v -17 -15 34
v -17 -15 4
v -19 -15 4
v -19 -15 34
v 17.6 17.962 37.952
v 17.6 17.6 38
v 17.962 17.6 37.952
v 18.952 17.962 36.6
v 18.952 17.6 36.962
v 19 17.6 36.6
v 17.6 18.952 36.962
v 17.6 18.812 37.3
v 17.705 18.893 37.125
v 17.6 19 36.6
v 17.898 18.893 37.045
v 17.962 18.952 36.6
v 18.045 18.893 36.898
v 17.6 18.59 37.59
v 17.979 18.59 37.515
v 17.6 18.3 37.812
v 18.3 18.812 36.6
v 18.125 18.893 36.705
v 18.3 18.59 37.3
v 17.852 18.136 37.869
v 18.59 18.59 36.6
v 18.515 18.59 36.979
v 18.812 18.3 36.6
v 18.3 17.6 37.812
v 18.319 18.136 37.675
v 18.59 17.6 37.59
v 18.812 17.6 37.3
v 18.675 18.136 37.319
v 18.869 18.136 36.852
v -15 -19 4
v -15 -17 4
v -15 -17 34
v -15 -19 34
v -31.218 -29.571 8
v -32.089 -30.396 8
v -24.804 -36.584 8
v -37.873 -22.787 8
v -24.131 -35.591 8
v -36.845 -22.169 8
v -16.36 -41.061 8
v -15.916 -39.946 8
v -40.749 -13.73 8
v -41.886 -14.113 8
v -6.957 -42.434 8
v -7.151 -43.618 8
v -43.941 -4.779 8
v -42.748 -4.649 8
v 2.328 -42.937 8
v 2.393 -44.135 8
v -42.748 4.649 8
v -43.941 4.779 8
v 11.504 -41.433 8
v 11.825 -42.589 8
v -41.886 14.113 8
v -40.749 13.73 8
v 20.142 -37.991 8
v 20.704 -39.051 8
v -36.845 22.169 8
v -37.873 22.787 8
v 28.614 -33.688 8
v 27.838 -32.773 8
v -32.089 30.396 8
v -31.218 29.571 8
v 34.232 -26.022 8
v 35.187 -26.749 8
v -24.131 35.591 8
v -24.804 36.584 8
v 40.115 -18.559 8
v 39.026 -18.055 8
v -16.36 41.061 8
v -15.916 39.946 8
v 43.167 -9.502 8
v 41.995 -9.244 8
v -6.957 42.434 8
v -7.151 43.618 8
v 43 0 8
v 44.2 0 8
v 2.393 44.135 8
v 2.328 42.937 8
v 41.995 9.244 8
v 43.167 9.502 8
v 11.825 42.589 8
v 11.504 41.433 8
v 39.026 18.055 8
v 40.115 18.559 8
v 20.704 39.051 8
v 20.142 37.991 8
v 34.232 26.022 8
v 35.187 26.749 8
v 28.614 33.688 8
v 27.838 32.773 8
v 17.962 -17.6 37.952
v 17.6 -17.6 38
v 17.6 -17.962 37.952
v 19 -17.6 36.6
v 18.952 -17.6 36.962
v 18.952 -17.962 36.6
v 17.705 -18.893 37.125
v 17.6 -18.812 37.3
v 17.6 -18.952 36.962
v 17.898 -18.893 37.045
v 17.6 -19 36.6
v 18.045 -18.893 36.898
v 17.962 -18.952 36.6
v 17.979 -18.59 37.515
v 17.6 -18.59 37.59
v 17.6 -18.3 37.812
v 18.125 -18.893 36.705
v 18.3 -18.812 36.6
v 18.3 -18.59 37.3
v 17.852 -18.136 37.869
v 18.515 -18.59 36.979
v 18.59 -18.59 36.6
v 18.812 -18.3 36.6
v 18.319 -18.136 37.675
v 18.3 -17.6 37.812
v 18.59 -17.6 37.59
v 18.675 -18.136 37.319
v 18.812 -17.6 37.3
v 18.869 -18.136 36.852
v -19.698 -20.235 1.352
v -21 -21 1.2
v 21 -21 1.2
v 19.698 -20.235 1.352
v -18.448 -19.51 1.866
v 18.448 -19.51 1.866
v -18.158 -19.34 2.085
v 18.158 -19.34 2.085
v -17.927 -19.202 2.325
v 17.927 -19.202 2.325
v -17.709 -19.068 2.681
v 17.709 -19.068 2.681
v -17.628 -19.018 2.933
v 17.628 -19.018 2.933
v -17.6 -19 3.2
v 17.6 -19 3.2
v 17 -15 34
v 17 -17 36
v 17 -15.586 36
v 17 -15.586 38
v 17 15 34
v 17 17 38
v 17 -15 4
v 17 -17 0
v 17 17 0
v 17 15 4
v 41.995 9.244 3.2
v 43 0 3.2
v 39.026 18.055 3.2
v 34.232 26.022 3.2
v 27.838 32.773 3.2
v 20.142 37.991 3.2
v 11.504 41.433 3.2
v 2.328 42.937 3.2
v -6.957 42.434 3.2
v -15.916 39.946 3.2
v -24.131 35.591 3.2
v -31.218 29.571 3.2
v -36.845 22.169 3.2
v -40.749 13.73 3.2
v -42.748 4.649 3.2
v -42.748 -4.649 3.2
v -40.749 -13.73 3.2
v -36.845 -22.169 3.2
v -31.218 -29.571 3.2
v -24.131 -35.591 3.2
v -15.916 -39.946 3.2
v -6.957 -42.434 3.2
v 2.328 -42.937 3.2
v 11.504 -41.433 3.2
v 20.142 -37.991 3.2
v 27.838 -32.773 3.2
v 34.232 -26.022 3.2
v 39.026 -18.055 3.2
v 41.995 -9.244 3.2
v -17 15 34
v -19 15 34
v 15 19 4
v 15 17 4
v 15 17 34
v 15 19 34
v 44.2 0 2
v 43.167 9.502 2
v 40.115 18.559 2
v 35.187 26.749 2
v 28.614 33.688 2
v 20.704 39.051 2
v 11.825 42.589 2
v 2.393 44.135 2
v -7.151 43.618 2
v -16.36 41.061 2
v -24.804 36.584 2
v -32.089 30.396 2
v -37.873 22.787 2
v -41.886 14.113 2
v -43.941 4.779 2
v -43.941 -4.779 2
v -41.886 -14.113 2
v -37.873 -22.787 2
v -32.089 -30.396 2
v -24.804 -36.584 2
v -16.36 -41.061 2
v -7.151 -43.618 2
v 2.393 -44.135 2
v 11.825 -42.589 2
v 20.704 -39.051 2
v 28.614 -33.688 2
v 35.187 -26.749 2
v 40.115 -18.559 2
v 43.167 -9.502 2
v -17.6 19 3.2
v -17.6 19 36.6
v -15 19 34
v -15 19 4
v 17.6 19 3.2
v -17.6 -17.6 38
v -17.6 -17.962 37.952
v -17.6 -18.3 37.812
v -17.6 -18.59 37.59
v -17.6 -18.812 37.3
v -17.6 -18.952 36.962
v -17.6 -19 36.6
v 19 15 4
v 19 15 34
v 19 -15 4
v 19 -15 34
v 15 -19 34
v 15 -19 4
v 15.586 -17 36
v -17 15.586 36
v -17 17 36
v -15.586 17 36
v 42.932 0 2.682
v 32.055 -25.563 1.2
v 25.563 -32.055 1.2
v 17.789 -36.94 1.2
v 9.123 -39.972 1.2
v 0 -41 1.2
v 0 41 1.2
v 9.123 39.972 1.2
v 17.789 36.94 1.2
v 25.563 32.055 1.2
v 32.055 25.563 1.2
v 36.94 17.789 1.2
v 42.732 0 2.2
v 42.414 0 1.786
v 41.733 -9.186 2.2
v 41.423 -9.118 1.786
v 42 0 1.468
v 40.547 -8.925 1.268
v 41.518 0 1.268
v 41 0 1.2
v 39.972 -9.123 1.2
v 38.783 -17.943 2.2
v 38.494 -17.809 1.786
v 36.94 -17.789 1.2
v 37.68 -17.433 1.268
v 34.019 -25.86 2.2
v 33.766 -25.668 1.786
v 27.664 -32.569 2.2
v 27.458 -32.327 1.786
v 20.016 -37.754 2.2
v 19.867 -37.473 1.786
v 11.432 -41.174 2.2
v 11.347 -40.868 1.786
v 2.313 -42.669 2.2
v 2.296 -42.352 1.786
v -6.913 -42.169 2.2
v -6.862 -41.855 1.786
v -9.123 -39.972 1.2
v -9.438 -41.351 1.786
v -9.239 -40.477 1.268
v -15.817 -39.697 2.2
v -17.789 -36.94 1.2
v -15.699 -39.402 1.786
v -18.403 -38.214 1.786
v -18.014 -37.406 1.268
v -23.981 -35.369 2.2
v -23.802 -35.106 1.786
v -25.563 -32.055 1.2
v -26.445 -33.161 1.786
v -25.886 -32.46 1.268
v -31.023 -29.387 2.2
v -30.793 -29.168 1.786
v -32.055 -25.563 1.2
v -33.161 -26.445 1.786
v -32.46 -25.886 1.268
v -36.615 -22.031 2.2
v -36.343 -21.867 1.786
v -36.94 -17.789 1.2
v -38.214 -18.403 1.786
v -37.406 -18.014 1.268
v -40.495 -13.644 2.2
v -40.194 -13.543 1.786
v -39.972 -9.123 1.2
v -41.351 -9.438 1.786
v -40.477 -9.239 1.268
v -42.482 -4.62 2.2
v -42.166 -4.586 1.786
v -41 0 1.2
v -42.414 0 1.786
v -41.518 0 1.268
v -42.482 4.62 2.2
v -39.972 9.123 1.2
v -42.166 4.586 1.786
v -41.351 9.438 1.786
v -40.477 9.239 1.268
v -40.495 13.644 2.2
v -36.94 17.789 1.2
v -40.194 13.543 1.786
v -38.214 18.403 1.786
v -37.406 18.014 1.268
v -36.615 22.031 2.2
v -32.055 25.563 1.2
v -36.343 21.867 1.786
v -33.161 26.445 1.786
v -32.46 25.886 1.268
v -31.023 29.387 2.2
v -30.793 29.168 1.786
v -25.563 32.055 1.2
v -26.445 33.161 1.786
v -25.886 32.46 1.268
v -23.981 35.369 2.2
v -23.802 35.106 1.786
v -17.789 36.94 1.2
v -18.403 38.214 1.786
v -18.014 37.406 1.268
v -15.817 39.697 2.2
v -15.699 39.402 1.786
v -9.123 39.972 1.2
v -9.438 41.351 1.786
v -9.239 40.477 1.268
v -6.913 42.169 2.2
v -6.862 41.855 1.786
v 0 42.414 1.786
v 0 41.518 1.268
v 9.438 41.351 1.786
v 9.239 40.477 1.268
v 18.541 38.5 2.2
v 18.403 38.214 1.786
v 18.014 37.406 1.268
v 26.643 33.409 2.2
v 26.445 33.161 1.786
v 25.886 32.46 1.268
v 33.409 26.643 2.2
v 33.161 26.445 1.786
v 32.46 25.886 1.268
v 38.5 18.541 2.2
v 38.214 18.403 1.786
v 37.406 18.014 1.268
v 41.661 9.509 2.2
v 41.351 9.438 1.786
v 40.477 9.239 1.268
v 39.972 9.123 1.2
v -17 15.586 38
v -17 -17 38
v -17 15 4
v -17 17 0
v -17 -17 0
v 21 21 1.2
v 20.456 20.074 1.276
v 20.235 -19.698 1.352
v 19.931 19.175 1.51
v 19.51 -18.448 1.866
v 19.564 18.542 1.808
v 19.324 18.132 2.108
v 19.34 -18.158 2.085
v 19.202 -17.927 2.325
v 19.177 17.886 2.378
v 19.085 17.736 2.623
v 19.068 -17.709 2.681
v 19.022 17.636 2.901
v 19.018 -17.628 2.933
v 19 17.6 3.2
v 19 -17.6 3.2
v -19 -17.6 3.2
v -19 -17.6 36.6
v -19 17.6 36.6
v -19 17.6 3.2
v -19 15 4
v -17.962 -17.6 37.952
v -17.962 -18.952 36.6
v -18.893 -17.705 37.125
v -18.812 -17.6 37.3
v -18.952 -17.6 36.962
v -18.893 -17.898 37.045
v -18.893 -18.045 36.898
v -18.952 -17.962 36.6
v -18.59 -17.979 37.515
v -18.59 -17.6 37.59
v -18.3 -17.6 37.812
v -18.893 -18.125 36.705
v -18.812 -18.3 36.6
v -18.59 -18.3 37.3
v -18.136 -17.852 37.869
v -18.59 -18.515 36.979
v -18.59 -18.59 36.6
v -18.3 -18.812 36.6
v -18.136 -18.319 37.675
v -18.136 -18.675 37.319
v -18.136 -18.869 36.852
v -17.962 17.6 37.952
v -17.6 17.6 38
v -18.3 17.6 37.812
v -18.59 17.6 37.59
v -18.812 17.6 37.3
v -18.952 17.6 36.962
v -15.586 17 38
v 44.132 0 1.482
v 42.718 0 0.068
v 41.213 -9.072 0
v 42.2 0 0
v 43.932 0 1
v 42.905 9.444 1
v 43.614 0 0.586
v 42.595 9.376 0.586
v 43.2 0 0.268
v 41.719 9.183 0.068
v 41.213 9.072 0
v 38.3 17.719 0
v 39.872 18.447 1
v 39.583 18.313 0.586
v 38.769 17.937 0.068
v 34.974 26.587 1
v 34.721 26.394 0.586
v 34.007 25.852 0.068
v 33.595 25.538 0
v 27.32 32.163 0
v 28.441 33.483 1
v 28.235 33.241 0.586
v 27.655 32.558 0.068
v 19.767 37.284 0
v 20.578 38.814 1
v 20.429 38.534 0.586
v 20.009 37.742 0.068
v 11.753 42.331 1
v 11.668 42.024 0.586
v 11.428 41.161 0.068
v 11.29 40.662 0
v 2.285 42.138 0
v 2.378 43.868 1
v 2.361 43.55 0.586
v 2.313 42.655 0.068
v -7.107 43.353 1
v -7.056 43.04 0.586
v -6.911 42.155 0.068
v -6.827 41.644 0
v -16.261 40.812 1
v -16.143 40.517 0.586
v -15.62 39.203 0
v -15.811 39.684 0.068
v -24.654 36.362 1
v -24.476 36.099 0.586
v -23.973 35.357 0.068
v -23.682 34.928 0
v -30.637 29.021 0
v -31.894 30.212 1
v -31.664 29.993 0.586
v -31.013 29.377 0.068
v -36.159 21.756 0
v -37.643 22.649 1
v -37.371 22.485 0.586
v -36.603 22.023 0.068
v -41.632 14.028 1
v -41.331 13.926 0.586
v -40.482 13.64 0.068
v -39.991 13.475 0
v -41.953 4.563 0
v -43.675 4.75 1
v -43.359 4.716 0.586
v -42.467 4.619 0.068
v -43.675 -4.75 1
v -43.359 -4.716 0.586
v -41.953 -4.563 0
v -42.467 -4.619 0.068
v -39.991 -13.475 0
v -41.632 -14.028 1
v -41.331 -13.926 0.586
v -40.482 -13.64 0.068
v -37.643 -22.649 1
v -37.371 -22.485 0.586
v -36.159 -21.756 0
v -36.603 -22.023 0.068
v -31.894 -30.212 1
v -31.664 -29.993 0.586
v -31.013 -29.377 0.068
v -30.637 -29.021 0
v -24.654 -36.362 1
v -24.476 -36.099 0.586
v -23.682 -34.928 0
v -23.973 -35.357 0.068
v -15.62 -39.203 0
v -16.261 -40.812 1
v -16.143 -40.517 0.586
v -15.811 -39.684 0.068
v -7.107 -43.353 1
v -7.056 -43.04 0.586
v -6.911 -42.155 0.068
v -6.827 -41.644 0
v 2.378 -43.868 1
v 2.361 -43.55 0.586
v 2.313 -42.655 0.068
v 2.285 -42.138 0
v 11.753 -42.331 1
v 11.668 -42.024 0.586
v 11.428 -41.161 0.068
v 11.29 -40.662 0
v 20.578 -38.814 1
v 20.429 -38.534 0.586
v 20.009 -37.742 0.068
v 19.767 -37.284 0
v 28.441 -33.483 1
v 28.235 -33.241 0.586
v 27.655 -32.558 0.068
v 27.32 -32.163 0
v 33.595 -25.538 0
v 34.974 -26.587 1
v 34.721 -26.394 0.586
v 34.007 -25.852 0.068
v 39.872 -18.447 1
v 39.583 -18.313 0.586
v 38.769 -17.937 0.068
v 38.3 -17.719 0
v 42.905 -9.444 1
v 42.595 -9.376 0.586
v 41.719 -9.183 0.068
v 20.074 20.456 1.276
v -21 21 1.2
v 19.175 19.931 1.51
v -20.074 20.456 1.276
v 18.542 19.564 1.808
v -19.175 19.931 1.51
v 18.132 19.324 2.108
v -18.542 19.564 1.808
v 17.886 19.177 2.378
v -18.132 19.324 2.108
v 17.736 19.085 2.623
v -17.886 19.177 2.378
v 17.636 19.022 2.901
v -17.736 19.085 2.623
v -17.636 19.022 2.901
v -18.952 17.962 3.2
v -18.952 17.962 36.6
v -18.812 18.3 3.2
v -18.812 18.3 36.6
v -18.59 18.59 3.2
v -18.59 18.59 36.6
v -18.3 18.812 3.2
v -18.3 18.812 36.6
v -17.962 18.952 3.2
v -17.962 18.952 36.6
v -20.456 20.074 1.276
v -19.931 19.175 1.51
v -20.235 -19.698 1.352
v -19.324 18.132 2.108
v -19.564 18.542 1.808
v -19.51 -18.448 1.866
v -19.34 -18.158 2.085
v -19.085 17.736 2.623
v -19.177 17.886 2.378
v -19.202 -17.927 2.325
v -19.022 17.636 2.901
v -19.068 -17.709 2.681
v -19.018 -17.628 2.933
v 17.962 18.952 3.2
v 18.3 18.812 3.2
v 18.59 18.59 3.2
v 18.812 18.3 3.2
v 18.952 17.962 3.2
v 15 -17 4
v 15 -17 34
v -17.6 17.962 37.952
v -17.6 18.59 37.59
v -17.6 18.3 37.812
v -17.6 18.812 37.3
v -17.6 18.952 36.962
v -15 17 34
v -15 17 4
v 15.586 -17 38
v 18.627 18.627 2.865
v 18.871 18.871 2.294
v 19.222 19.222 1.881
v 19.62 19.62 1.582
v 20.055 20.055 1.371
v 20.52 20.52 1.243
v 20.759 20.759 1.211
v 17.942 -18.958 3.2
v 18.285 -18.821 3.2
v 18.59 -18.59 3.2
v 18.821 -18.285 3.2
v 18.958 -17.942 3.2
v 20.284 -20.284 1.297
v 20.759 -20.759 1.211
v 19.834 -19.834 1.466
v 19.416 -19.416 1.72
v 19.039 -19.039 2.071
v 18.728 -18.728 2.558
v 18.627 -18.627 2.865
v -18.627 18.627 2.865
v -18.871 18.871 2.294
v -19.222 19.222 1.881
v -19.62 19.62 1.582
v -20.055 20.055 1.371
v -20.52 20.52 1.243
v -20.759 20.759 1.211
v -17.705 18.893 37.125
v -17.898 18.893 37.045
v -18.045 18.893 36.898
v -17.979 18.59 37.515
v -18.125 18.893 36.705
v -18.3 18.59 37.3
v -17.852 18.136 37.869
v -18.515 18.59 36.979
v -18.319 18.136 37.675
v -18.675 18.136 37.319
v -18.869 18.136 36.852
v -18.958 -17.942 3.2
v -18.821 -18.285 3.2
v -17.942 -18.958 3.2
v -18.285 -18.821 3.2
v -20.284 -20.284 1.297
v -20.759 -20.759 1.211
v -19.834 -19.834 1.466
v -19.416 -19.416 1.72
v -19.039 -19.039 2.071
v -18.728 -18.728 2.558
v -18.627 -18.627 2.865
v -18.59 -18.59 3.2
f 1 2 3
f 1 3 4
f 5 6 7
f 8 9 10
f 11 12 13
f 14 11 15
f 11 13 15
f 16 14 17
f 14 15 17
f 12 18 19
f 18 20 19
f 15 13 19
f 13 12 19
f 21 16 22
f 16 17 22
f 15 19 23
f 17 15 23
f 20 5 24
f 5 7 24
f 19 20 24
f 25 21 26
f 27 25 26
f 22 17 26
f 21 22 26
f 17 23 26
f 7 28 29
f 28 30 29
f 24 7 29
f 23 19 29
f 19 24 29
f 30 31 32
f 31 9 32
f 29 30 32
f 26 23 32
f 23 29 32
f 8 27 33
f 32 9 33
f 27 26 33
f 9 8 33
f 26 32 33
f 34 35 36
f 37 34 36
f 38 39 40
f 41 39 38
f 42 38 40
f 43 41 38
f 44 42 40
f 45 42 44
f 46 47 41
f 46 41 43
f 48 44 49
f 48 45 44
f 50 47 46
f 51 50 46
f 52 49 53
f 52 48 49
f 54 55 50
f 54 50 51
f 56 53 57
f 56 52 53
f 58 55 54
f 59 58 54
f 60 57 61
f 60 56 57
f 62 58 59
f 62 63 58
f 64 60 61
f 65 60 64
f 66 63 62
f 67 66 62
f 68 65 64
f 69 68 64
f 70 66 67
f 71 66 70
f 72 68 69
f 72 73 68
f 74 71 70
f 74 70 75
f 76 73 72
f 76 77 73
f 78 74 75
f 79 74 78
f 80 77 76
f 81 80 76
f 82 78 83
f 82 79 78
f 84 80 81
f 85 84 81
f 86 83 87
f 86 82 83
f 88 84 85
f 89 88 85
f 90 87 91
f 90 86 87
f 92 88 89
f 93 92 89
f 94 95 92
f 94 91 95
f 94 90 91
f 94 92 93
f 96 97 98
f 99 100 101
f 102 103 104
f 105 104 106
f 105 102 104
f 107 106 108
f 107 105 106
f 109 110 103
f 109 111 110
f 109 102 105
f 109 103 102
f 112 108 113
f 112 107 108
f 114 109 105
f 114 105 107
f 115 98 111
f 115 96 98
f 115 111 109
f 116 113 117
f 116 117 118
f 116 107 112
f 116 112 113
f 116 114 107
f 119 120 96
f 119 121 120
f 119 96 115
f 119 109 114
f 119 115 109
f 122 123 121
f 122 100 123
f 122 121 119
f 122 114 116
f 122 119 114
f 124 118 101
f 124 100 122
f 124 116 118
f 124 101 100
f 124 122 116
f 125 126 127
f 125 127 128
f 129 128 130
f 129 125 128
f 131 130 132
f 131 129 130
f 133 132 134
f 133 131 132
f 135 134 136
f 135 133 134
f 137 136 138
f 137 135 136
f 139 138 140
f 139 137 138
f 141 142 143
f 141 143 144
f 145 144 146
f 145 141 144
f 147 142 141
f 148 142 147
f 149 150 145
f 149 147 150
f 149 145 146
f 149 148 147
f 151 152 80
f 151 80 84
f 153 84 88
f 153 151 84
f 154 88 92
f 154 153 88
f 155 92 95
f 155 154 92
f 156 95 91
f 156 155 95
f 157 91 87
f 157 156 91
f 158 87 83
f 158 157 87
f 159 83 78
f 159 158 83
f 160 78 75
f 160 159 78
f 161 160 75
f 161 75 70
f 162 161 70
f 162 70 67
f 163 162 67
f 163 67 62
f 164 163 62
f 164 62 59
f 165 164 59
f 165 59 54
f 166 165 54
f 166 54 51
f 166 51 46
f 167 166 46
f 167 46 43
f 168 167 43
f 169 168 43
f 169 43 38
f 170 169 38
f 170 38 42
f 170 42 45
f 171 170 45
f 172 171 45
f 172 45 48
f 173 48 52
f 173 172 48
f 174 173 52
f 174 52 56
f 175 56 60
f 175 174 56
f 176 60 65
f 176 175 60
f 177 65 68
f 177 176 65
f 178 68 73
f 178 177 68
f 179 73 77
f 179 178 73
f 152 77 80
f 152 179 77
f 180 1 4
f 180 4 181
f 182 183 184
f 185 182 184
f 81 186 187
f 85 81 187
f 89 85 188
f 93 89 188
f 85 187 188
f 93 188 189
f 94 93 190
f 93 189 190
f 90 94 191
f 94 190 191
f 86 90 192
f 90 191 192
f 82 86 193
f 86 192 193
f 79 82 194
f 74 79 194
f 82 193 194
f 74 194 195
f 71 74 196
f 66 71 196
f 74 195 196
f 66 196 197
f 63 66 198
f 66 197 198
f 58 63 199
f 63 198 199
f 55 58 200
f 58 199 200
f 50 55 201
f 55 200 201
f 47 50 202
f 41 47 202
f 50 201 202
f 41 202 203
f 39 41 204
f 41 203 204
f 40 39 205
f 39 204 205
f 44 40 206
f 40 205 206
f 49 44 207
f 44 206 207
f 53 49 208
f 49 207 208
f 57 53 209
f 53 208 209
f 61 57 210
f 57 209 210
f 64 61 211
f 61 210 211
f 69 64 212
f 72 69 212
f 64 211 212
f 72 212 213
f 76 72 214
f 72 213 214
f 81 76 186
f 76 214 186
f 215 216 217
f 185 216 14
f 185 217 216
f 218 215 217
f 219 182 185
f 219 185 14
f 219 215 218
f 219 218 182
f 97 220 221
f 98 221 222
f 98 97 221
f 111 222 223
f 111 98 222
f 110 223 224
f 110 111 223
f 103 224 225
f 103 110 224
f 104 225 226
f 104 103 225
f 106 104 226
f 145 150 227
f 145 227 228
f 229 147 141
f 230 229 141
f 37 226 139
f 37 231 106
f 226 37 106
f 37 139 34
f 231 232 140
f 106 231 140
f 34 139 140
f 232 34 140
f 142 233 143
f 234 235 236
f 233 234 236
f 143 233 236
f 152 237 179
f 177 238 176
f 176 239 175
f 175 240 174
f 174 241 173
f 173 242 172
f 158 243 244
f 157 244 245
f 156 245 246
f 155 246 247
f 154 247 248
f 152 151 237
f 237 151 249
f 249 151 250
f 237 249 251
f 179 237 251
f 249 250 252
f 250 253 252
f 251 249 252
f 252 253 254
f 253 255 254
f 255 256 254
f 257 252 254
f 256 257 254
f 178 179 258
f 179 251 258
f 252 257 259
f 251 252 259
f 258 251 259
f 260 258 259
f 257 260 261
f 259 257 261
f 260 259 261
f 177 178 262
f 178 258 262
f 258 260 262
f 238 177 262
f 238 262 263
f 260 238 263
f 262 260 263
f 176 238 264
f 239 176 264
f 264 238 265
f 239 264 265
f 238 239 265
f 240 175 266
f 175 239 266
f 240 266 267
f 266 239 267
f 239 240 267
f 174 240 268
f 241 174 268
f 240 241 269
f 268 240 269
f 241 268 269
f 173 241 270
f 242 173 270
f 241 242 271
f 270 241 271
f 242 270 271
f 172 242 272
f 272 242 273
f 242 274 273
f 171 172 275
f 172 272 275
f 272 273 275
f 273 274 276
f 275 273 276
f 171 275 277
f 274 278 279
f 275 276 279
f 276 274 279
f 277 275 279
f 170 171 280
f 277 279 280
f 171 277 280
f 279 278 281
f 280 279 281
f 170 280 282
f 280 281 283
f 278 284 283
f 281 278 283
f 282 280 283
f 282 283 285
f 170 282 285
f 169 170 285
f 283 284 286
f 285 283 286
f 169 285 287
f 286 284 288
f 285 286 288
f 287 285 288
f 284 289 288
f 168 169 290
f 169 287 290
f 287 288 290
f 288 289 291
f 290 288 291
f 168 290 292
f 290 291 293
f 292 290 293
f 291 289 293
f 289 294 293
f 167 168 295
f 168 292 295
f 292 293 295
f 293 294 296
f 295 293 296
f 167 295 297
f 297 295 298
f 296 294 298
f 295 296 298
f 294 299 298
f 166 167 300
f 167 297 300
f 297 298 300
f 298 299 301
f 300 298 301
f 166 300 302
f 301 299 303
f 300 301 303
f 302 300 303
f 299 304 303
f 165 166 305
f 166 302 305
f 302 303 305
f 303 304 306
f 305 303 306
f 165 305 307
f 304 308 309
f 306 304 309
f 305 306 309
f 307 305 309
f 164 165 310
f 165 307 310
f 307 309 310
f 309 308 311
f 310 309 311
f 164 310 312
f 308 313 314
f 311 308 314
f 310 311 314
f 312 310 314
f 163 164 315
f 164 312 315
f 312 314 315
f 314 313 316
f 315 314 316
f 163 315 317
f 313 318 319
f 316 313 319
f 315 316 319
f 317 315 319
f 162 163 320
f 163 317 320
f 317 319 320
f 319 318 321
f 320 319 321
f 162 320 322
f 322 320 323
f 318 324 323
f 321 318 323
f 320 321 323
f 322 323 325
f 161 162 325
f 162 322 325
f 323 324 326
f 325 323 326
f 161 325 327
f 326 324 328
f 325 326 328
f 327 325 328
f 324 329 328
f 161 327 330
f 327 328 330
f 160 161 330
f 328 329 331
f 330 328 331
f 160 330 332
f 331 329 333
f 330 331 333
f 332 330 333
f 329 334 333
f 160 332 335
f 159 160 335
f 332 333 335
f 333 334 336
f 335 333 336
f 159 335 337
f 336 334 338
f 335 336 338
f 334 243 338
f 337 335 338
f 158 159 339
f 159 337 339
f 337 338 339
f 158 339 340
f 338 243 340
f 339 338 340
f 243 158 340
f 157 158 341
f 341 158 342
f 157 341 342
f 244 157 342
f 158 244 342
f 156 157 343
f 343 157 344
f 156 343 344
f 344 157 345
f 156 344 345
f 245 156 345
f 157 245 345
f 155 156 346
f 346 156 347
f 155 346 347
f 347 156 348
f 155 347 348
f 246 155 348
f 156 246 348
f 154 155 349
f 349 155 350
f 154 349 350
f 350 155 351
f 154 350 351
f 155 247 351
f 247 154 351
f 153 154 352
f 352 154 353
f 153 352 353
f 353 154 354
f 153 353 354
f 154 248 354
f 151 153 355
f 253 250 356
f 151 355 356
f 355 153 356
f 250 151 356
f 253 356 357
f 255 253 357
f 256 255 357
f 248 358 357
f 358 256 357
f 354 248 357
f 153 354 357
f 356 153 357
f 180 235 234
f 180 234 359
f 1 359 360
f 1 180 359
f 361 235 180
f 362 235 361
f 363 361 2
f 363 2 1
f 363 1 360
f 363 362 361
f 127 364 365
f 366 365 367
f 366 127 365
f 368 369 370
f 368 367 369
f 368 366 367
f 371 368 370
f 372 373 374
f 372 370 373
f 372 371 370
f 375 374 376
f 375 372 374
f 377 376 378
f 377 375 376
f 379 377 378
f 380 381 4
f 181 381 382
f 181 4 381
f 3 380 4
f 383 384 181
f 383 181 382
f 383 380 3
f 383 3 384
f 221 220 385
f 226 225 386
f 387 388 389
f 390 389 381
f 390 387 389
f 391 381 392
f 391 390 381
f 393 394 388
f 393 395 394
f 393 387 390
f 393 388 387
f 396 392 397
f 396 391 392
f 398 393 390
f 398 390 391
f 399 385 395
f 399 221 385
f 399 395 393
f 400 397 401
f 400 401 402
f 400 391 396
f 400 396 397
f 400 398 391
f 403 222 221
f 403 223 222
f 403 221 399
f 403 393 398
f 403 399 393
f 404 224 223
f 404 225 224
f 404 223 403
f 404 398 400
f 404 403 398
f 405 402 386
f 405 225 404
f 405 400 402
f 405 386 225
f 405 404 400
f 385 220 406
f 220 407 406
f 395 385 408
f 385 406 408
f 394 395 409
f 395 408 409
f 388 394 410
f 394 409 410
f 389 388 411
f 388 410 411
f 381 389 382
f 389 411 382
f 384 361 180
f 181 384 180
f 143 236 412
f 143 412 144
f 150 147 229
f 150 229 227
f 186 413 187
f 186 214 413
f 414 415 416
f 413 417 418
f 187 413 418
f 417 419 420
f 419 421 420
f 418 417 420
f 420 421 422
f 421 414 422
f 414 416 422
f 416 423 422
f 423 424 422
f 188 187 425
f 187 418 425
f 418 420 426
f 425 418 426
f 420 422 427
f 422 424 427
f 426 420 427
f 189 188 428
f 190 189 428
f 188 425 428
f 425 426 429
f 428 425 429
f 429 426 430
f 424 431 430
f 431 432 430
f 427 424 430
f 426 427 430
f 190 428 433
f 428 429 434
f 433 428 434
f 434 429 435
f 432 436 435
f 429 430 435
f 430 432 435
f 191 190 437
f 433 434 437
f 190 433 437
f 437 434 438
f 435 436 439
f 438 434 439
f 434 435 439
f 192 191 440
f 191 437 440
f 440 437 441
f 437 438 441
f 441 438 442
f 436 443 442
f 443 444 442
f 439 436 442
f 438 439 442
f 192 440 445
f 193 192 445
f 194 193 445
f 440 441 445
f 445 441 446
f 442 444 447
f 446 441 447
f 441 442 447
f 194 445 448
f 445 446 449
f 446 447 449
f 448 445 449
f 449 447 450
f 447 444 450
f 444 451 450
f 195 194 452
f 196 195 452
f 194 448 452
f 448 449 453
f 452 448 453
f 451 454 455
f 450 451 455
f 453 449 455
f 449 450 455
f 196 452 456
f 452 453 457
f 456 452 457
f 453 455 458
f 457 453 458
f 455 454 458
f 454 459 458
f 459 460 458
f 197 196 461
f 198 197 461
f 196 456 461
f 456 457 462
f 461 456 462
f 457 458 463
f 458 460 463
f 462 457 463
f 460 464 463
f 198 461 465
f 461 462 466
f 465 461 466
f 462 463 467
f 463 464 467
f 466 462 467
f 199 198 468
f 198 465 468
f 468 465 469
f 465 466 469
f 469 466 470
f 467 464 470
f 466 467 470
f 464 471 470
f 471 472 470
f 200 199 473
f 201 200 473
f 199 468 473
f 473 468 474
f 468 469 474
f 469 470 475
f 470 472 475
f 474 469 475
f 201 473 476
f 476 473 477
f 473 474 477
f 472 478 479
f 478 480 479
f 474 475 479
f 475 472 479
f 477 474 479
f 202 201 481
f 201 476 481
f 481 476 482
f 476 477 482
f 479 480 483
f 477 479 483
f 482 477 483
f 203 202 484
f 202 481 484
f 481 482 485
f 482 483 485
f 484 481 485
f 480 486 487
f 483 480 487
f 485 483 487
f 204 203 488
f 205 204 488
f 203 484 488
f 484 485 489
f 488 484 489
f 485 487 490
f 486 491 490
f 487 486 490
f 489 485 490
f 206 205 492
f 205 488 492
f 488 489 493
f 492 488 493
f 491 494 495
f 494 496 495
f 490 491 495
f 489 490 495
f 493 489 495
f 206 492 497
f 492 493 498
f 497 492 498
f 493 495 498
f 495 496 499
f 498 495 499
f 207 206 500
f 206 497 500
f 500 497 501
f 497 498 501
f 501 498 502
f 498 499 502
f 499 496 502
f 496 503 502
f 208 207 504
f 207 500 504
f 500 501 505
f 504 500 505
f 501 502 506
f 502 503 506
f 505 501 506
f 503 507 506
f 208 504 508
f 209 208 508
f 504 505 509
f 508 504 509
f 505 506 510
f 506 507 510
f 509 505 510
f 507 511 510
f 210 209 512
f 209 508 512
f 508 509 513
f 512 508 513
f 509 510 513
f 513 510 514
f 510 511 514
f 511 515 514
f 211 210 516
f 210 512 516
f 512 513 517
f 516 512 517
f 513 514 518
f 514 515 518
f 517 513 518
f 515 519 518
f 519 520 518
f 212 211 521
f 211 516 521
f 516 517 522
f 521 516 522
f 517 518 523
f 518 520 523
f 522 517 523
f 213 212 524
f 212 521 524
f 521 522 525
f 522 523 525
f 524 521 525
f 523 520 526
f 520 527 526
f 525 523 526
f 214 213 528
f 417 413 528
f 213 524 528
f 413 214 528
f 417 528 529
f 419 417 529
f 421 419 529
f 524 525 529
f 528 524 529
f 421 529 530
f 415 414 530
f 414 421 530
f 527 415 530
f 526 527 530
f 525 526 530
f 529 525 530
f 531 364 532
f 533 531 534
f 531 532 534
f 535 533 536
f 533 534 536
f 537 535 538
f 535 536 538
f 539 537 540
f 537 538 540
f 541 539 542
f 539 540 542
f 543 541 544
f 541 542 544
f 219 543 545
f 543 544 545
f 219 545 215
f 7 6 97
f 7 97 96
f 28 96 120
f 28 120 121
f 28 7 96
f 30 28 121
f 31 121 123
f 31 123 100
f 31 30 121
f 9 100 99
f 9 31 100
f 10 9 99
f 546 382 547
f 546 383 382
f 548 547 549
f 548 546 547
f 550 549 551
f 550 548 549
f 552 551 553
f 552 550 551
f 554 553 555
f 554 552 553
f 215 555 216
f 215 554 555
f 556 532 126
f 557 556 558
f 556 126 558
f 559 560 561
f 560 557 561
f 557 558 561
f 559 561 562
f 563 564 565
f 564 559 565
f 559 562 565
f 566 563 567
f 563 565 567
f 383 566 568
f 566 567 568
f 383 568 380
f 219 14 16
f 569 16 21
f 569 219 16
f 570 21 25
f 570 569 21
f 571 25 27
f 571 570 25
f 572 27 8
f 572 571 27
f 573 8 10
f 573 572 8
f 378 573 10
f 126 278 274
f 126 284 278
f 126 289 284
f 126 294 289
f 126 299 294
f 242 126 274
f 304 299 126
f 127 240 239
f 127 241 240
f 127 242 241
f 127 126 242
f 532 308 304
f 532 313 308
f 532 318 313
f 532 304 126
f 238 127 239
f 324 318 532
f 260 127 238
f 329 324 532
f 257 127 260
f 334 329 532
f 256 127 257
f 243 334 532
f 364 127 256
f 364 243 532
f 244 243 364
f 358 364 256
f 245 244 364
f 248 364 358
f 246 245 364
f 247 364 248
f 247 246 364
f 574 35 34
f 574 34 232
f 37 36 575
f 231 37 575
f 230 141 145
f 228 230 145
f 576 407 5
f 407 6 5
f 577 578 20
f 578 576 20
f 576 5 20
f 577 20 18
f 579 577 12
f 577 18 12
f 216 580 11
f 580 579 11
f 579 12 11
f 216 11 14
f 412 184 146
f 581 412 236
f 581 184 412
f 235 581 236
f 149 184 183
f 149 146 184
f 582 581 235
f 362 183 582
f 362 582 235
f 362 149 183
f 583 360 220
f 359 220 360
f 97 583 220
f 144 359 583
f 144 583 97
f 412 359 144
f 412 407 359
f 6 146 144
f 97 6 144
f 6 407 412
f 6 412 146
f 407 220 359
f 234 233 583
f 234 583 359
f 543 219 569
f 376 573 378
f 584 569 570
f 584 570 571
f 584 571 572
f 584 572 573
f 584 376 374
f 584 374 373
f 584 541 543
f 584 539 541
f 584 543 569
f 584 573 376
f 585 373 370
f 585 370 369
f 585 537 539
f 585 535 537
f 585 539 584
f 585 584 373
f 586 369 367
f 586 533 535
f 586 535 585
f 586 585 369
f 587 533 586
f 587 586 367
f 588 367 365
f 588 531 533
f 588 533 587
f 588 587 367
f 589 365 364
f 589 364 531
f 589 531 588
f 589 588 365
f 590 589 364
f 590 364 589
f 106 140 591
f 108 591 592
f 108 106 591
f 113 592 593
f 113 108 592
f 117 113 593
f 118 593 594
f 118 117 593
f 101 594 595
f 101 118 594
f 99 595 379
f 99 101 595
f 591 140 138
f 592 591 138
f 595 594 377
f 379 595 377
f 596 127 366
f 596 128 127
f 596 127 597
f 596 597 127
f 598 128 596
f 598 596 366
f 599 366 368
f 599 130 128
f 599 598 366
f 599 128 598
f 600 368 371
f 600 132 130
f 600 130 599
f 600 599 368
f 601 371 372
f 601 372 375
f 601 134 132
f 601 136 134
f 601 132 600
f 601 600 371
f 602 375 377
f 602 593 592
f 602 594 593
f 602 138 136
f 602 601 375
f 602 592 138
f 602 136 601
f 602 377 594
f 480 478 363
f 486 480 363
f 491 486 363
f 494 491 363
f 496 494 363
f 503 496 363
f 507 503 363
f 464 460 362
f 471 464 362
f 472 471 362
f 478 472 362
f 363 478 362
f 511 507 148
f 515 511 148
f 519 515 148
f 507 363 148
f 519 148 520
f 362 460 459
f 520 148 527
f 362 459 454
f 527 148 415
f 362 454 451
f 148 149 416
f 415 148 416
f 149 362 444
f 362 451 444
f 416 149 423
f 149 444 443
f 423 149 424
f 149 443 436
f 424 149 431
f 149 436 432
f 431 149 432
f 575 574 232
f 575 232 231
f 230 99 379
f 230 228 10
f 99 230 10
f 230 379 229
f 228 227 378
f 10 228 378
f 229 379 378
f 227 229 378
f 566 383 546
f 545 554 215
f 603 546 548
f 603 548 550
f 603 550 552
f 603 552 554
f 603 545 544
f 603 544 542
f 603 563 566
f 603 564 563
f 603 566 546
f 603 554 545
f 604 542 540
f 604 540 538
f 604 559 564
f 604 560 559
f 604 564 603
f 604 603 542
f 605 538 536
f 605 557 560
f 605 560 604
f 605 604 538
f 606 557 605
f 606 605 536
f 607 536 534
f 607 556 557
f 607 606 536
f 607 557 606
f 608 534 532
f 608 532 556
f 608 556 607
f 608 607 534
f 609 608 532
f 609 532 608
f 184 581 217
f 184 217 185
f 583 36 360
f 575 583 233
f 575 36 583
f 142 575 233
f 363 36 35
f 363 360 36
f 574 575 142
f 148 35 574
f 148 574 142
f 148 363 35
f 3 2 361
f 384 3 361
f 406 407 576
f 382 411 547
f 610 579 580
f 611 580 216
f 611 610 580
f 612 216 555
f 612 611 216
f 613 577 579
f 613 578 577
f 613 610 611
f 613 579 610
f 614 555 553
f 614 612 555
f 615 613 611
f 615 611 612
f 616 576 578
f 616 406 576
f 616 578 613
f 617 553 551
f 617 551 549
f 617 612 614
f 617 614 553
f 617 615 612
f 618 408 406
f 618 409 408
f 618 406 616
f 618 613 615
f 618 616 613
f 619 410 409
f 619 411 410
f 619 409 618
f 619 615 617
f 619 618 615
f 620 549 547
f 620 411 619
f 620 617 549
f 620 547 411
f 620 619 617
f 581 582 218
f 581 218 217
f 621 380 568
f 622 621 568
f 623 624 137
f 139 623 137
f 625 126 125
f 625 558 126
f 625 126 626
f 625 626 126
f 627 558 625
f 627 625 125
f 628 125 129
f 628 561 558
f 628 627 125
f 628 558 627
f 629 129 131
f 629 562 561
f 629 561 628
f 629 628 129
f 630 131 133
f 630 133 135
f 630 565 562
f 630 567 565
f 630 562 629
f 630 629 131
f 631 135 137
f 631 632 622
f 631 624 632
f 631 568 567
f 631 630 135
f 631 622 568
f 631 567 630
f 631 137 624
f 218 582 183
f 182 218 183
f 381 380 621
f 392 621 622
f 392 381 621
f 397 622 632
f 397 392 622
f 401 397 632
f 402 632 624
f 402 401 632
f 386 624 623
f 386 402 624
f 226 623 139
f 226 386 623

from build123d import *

# Parameters (mm, degrees)
SKETCH001_R          = 44.2
SKETCH001_W          = 34
SKETCH001_H          = 34
PAD_DEPTH            = 1.2
SKETCH002_W          = 38
SKETCH002_H          = 38
SKETCH002_W_2        = 34
SKETCH002_H_2        = 34
PAD001_DEPTH         = 36
SKETCH003_W          = 38
SKETCH003_H          = 38
PAD002_DEPTH         = 2
SKETCH004_W          = 30
SKETCH004_H          = 30
POCKET_DEPTH         = 44.201
POCKET_DEPTH_BACK    = -44.201
SKETCH005_W          = 30
SKETCH005_H          = 30
POCKET001_DEPTH      = 44.201
POCKET001_DEPTH_BACK = -44.201
POCKET002_DEPTH      = 299.329299
POLARPATTERN_COUNT   = 2
SKETCH007_R          = 44.2
SKETCH007_R_2        = 43
PAD003_DEPTH         = 8
FILLET_R             = 2
FILLET001_R          = 2
FILLET002_R          = 1.4


with BuildPart() as part:
    # Sketch001 → Pad (new body)
    with BuildSketch(Plane.XY):
        Circle(SKETCH001_R)
        Rectangle(SKETCH001_W, SKETCH001_H, mode=Mode.SUBTRACT)
    extrude(amount=PAD_DEPTH)

    # Sketch002 → Pad001 (join)
    with BuildSketch(Plane.XY):
        Rectangle(SKETCH002_W, SKETCH002_H)
        Rectangle(SKETCH002_W_2, SKETCH002_H_2, mode=Mode.SUBTRACT)
    extrude(amount=PAD001_DEPTH)

    # Sketch003 (on Plane of DatumPlane) → Pad002 (join)
    with BuildSketch(Plane.XY.offset(36)):
        Rectangle(SKETCH003_W, SKETCH003_H)
    extrude(amount=PAD002_DEPTH)

    # Sketch004 → Pocket (cut, two sides)
    with BuildSketch(Plane.YZ) as pocket_sk:
        with Locations((0, 19)):
            Rectangle(SKETCH004_W, SKETCH004_H)
    extrude(amount=-POCKET_DEPTH, mode=Mode.SUBTRACT)
    extrude(pocket_sk.sketch, amount=-POCKET_DEPTH_BACK, mode=Mode.SUBTRACT)

    # Sketch005 → Pocket001 (cut, two sides)
    with BuildSketch(Plane.XZ) as pocket001_sk:
        with Locations((0, 19)):
            Rectangle(SKETCH005_W, SKETCH005_H)
    extrude(amount=-POCKET001_DEPTH, mode=Mode.SUBTRACT)
    extrude(pocket001_sk.sketch, amount=-POCKET001_DEPTH_BACK, mode=Mode.SUBTRACT)

    # Sketch006 → Pocket002 (cut, through all)
    with BuildSketch(Plane.XY):
        Polygon((-17, 15.585786), (-17, -17), (15.585786, -17), align=None)
    pocket002 = extrude(amount=POCKET002_DEPTH, mode=Mode.SUBTRACT)

    # PolarPattern: Pocket002 ×2 about axis
    polarpattern_axis = Axis((0, 0, 0), (0, 0, 1))
    for i in range(1, POLARPATTERN_COUNT):
        add(pocket002.rotate(polarpattern_axis, i * 360 / POLARPATTERN_COUNT), mode=Mode.SUBTRACT)

    # Sketch007 → Pad003 (join)
    with BuildSketch(Plane.XY):
        Circle(SKETCH007_R)
        Circle(SKETCH007_R_2, mode=Mode.SUBTRACT)
    extrude(amount=PAD003_DEPTH)

    # Fillet
    fillet_edges = [part.edges().sort_by_distance(p)[0] for p in [
        (0, -19, 1.2),
        (-19, 0, 1.2),
        (19, 0, 1.2),
        (0, 19, 1.2),
        (-43, 0, 1.2),
    ]]
    fillet(fillet_edges, radius=FILLET_R)

    # Fillet001
    fillet001_edges = [part.edges().sort_by_distance(p)[0] for p in [
        (-44.2, 0, 0),
    ]]
    fillet(fillet001_edges, radius=FILLET001_R)

    # Fillet002
    fillet002_edges = [part.edges().sort_by_distance(p)[0] for p in [
        (19, 0, 38),
        (0, -19, 38),
        (-19, 0, 38),
        (0, 19, 38),
        (19, 19, 19.6),
        (19, -19, 19.6),
        (-19, -19, 19.6),
        (-19, 19, 19.6),
    ]]
    fillet(fillet002_edges, radius=FILLET002_R)


solid = part.part
